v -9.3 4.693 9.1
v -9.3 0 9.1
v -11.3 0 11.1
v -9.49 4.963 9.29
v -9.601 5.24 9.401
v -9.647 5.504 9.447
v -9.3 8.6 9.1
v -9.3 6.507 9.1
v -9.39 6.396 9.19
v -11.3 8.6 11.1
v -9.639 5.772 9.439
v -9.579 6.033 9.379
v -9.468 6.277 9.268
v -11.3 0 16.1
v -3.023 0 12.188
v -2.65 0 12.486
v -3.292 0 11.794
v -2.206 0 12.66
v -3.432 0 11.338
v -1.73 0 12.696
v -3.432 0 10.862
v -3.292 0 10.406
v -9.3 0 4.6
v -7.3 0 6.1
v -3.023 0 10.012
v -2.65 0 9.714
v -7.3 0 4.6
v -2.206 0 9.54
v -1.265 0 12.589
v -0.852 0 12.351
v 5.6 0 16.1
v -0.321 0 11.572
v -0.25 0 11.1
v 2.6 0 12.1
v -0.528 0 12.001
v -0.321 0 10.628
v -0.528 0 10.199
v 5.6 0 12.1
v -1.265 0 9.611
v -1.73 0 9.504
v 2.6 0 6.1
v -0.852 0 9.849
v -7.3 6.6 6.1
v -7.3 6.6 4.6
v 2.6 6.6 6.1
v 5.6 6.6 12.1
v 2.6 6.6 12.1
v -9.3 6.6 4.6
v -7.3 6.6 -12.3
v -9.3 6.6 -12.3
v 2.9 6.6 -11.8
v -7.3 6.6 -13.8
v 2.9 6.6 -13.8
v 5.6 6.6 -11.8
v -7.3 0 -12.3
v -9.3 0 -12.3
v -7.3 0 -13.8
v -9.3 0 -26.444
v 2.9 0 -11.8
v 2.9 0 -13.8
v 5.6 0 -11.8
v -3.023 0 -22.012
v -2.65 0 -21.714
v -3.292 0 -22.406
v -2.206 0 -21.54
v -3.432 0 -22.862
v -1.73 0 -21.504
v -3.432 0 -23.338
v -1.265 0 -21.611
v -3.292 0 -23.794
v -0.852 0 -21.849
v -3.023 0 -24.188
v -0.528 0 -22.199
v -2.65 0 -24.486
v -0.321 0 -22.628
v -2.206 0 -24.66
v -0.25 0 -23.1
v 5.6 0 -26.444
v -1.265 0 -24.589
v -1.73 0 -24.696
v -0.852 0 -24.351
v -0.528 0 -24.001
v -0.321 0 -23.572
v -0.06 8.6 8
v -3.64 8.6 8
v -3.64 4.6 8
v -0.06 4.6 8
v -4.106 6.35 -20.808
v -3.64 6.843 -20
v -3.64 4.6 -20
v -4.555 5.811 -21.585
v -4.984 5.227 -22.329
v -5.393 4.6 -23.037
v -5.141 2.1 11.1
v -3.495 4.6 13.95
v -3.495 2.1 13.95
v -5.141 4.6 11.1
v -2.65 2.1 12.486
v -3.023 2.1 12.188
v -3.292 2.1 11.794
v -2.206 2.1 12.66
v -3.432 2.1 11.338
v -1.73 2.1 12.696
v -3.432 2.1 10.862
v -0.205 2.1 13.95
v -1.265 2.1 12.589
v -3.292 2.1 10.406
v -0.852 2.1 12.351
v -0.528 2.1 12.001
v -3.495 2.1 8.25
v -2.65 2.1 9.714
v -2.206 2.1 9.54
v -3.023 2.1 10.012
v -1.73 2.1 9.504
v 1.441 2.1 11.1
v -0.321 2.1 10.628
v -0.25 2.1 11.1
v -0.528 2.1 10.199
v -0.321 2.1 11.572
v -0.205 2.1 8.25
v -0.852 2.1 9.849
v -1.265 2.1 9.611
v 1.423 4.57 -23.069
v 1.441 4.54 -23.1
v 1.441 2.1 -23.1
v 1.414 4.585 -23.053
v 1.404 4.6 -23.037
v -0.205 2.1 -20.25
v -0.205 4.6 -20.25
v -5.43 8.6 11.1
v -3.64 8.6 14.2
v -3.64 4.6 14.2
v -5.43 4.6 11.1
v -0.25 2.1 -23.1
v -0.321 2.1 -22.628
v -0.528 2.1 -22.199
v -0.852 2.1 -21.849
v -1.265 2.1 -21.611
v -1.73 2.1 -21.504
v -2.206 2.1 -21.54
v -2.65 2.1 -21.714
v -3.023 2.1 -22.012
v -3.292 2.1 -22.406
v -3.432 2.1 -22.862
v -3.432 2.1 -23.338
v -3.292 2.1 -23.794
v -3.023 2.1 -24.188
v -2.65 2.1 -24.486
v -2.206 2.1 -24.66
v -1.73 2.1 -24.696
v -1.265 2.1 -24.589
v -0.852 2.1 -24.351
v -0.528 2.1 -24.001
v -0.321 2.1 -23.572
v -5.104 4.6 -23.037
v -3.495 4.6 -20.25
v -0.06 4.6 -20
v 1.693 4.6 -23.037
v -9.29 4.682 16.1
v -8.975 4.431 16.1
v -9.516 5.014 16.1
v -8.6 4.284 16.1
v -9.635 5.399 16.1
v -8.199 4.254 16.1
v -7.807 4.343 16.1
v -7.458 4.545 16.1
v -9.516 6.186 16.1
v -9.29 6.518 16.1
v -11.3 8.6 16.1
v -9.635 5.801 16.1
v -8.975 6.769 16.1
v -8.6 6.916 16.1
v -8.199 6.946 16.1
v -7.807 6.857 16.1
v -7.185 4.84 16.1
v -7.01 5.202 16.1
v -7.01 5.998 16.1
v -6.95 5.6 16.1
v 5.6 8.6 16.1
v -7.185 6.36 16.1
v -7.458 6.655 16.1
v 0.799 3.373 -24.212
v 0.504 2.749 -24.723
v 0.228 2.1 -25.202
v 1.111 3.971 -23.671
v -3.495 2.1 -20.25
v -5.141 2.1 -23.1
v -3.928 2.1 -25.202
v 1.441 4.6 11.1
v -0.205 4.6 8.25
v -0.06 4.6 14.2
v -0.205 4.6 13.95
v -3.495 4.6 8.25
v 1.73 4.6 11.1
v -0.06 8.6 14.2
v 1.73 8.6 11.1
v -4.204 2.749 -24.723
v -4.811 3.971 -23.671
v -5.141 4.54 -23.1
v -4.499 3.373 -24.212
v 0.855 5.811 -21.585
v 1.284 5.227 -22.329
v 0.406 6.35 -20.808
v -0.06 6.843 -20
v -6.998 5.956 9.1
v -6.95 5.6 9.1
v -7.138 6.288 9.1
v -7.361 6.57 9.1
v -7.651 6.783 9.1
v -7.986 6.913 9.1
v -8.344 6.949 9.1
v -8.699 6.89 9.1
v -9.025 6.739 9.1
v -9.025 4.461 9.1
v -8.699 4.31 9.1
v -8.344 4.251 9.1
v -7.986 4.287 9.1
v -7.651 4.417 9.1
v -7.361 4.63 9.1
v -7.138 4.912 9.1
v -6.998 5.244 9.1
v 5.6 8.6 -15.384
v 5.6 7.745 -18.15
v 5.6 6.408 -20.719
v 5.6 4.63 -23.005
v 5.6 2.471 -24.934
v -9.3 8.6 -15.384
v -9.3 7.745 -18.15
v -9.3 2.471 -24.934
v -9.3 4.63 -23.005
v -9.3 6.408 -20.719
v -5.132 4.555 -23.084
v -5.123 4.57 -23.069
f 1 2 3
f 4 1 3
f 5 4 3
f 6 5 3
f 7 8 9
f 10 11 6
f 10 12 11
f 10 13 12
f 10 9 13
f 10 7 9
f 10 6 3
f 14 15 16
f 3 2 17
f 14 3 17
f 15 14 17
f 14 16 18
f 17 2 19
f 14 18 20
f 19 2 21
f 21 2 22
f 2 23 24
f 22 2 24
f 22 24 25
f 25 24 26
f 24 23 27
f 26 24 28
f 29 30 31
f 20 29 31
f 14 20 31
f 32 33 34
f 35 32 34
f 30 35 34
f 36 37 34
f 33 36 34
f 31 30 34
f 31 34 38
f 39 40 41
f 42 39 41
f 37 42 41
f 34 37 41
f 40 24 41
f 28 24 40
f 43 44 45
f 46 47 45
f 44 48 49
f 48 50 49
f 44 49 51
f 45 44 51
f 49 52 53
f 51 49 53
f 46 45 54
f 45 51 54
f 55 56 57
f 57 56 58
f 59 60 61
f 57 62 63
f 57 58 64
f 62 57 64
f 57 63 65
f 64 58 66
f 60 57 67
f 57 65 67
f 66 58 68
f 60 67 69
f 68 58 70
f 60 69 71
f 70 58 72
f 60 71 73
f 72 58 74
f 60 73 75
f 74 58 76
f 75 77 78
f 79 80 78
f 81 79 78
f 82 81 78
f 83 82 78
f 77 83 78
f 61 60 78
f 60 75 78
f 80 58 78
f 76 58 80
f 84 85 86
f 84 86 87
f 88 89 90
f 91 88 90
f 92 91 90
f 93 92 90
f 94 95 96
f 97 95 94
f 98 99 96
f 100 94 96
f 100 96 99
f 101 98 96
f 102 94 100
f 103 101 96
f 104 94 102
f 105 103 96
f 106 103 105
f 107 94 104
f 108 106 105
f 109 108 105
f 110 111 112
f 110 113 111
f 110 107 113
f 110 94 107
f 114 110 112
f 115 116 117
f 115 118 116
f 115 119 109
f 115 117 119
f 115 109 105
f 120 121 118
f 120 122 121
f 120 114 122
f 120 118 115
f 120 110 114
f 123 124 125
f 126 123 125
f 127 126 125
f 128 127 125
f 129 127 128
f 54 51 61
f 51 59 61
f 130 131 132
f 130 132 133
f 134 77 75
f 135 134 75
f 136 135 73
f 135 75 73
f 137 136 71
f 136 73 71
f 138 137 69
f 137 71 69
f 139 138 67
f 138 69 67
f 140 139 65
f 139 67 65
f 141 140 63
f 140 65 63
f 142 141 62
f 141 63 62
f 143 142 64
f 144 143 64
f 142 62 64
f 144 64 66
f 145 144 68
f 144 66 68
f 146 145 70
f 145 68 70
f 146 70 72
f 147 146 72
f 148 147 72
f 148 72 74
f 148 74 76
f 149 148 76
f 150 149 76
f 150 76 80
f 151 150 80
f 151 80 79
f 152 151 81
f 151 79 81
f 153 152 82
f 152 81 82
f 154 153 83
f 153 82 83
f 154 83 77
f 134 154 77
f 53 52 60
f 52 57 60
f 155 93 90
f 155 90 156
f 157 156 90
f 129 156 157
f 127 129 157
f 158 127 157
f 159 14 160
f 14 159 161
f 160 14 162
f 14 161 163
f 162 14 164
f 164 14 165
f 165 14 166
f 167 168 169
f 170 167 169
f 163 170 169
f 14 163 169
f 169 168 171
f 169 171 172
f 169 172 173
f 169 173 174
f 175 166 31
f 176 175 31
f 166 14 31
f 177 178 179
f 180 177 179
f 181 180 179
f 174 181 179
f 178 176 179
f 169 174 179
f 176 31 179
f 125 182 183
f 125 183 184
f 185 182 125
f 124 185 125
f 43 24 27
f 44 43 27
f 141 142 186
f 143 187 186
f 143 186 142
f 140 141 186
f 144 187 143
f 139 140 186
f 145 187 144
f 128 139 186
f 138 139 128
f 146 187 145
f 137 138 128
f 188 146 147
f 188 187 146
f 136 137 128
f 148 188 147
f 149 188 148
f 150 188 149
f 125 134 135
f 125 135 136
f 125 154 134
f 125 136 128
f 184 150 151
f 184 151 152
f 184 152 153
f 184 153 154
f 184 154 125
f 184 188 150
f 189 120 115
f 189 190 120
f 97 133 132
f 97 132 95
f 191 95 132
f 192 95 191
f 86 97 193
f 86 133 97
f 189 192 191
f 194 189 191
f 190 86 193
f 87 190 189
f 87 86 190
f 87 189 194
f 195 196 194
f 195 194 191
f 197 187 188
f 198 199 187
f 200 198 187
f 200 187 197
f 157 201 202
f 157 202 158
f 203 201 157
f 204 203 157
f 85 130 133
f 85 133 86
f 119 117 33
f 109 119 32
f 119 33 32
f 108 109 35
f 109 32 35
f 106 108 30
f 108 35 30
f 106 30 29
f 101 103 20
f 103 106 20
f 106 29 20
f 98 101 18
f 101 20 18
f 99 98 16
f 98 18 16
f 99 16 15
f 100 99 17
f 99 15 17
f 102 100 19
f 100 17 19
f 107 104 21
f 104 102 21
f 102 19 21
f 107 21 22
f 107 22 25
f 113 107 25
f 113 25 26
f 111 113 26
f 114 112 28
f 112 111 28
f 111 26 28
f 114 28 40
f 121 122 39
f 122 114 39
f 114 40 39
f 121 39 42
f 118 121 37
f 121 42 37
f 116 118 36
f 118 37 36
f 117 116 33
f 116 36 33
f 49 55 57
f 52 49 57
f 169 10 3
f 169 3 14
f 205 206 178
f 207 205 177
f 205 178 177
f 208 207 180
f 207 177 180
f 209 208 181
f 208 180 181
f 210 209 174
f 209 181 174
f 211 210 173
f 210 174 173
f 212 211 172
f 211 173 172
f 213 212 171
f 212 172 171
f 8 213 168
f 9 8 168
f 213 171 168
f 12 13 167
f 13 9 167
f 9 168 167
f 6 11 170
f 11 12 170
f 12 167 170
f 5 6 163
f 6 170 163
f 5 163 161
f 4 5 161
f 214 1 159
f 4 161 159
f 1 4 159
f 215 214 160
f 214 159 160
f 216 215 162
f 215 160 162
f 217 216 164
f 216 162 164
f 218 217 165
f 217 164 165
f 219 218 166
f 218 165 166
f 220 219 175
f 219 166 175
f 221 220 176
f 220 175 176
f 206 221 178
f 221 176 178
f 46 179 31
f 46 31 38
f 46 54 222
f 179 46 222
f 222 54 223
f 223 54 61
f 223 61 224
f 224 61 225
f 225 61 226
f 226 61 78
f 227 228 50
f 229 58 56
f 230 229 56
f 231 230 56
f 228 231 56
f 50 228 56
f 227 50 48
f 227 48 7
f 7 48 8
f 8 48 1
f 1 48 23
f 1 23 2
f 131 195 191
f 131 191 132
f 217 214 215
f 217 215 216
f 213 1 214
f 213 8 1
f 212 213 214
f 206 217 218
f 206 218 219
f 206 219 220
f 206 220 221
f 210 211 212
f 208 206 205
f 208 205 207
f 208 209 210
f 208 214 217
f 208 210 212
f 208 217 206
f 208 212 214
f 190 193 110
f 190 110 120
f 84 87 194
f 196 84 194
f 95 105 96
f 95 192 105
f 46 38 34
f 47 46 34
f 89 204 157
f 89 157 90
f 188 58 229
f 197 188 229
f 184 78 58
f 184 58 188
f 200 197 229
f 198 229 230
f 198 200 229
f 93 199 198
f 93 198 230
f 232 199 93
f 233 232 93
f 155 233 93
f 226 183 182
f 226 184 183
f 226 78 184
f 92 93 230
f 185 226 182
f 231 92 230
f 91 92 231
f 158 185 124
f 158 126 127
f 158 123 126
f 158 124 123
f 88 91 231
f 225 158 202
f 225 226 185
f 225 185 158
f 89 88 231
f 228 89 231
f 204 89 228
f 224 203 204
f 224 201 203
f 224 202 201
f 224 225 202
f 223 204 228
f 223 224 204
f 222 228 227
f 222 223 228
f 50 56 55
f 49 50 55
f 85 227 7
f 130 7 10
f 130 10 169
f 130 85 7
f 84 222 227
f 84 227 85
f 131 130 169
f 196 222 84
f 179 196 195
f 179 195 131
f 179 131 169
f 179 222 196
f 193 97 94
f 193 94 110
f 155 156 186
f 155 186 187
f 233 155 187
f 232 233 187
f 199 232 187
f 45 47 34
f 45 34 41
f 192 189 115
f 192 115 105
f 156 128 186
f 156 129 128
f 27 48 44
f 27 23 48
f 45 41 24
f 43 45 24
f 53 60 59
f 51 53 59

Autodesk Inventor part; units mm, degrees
ref_plane "YZ Plane" through (0, 0, 0) normal (1, 0, 0) x (0, 1, 0)
ref_plane "XZ Plane" through (0, 0, 0) normal (0, 1, 0) x (-1, 0, 0)
sketch "スケッチ1" plane through (0, 0, 0) normal (0, 1, 0) x (-1, 0, 0)
  line L0 (4.5, 6) -> (-4.5, 6) construction
  line L1 (-4.5, 6) -> (-4.5, -18) construction
  line L2 (-4.5, -18) -> (4.5, -18) construction
  line L3 (4.5, -18) -> (4.5, 6) construction
  line L4 (4.5, -6) -> (-4.5, -6)
  line L5 (0, -25.74) -> (0, 13.74) projected
  line L6 (0.5, -18) -> (0.5, -6) construction
  line L7 (4.6, -18.1) -> (-4.6, -18.1)
  line L8 (-4.6, -18.1) -> (-4.6, 6.1)
  line L9 (-4.6, 6.1) -> (4.6, 6.1)
  line L10 (4.6, 6.1) -> (4.6, -18.1)
  line L11 (0.4, -18.1) -> (0.4, -6)
  line L12 (-4.5, -6) -> (-4.6, -6)
  line L13 (4.5, -6) -> (4.6, -6)
  line L14 (6.6, -20.1) -> (-6.6, -20.1)
  line L15 (-6.6, -20.1) -> (-6.6, 8.1)
  line L16 (-6.6, 8.1) -> (6.6, 8.1)
  line L17 (6.6, 8.1) -> (6.6, -20.1)
  line L18 (0.4, -18.1) -> (-14.8, -18.1)
  line L19 (-14.8, -18.1) -> (-14.8, -6)
  line L20 (-14.8, -6) -> (0.4, -6)
  line L21 (0.4, -6) -> (0.4, -18.1)
  line L22 (-6.6, -20.1) -> (-14.8, -20.1)
  line L23 (-14.8, -20.1) -> (-14.8, -18.1)
  point P0 (0, 0)
  point P1 (0, -6)
  point P2 (-6.6, -6)
  point P3 (0, -20.1)
  point P4 (-6.6, -6)
  dimension "d0" = 6
  dimension "d1" = 12
  dimension "d2" = 12
  dimension "d3" = 9
  dimension "d4" = 4
  dimension "d5" = 0.1
  dimension "d6" = 0.1
  dimension "d7" = 0.1
  dimension "d8" = 0.1
  dimension "d9" = 0.1
  dimension "d10" = 2
  dimension "d11" = 2
  dimension "d12" = 15.2
extrude "押し出し1" add sketch "スケッチ1" against normal blind 2
extrude "押し出し2" add sketch "スケッチ1" against normal blind 12.2 contours L13 L10 L7 L11 L4 | L11 L7 L5 L4 | L10 L9 L5 L16 L17 L14 L7 | L5 L7 L8 L12 L4 | L5 L14 L15 L18 L7 | L9 L8 L20 L15 L16 L5 | L8 L18 L15 L20 | L15 L18 L19 L20 | L22 L23 L18 L15
sketch "スケッチ2" plane through (14.8, 0, -6) normal (1, 0, 0) x (0, 0, -1)
  line L0 (0, 0) -> (0, -12.2) projected
  line L1 (0, -2) -> (14.1, -2)
  line L2 (14.1, 0) -> (14.1, -12.2) projected
  line L3 (0, 0) -> (14.1, 0) projected
  circle A0 centre (6.05, -7.1) radius 6.05
  line L4 (0, 0) -> (0, -12.2) projected
  line L5 (0, 0) -> (14.1, 0) projected
  line L6 (0, 0) -> (0, -12.2) projected
  line L7 (14.1, -12.2) -> (0, -12.2) projected
  line L8 (14.1, 0) -> (14.1, -12.2) projected
  line L9 (12.1, 0) -> (12.1, -12.2)
  point P0 (-6, 0)
  point P1 (14.1, -7.1)
  point P2 (9.3046, -2)
  point P3 (2.7954, -2)
  point P4 (0, -7.1)
  point P5 (2.7954, -12.2)
  point P6 (9.3046, -12.2)
  point P7 (0, -7.1)
  point P8 (12.1, -7.1)
  dimension "d17" = 2
  dimension "d18" = 5.1
  dimension "d21" = 2
extrude "押し出し3" cut sketch "スケッチ2" against normal blind 15.2 contours A0 L7 L0 | A0 L1 L7 | L9 L7 A0
sketch "スケッチ3" plane through (6.6, 0, 8.1) normal (1, 0, 0) x (0, 0, -1)
  circle A0 centre (8.1, -7.1) radius 3
  line L0 (14.1, -12.2) -> (0, -12.2) projected
  line L1 (5.1, -12.2) -> (11.1, -12.2)
  line L2 (11.1, -12.2) -> (11.1, -7.1)
  line L3 (11.1, -7.1) -> (5.1, -7.1)
  line L4 (5.1, -7.1) -> (5.1, -12.2)
  point P0 (8.1, 0)
  dimension "d22" = 6
  dimension "d23" = 7.1
extrude "押し出し4" cut sketch "スケッチ3" against normal up to surface (2 mm away)
fillet "フィレット1" radius 0.5 2 edges at (10.7, -7.1, -6) (2.1, -7.1, -6)
sketch "スケッチ4" plane through (-0.4, 0, -6) normal (1, 0, 0) x (0, 0, -1)
  line L0 (-14.1, -12.2) -> (14.1, -12.2) projected
  line L1 (0, -12.2) -> (12.1, -12.2)
  line L2 (12.1, -12.2) -> (12.1, -2)
  line L3 (12.1, -2) -> (0, -2)
  line L4 (0, -2) -> (0, -12.2)
  line L5 (12.1, -7.1) -> (12.1, -12.2) projected
  line L6 (2.7954, -2) -> (9.3046, -2) projected
  point P0 (-6, 0)
extrude "押し出し5" cut sketch "スケッチ4" against normal up to surface (4.2 mm away)
ref_plane "作業平面1" through (-3.6, -12.2, 6.1) normal (1, 0, 0) x (0, 0, -1)
sketch "スケッチ5" plane through (-3.6, -12.2, 6.1) normal (1, 0, 0) x (0, 0, -1)
  line L0 (0, 10.2) -> (7.1, 10.2)
  line L1 (7.1, 10.2) -> (7.1, 5.2)
  line L2 (7.1, 5.2) -> (0, 5.2)
  line L3 (0, 5.2) -> (0, 10.2)
  line L4 (9.1, 0) -> (9.1, 5.1) projected
  point P0 (6.1, 12.2)
  dimension "d30" = 5
  dimension "d34" = 2
extrude "押し出し6" add sketch "スケッチ5" along normal blind 1.5
fillet "フィレット2" radius 3 2 edges at (-2.85, -7, -1) (-2.85, -7, 6.1)
sketch "スケッチ6" plane through (0, 0, 0) normal (0, 1, 0) x (1, 0, 0)
  line L0 (-6.6, -8.1) -> (6.6, -8.1) projected
  line L1 (5.6, -8.1) -> (2.6, -8.1)
  line L2 (2.6, -8.1) -> (2.6, -0.1)
  line L3 (2.6, -0.1) -> (5.6, -0.1)
  line L4 (5.6, -0.1) -> (5.6, -8.1)
  line L5 (6.6, -8.1) -> (6.6, 6) projected
  line L6 (-9.3, -8.1) -> (-7.3, -8.1)
  line L7 (-7.3, -8.1) -> (-7.3, 13.8)
  line L8 (-7.3, 13.8) -> (-9.3, 13.8)
  line L9 (-9.3, 13.8) -> (-9.3, -8.1)
  line L10 (-4.6, -6.1) -> (4.6, -6.1) projected
  line L11 (-7.3, -8.1) -> (2.6, -8.1)
  line L12 (2.6, -8.1) -> (2.6, -6.1)
  line L13 (2.6, -6.1) -> (-7.3, -6.1)
  line L14 (-7.3, -6.1) -> (-7.3, -8.1)
  line L15 (-9.3, 13.8) -> (2.9, 13.8)
  line L16 (2.9, 13.8) -> (2.9, 15.8)
  line L17 (2.9, 15.8) -> (-9.3, 15.8)
  line L18 (-9.3, 15.8) -> (-9.3, 13.8)
  line L19 (-9.3, 12.3) -> (-7.3, 12.3)
  line L20 (-9.3, -4.6) -> (-7.3, -4.6)
  line L21 (-7.3, -1.4667) -> (-9.3, -1.4667)
  line L22 (-9.3, -1.4667) -> (-9.3, 1.5333)
  line L23 (-9.3, 1.5333) -> (-7.3, 1.5333)
  line L24 (-7.3, 1.5333) -> (-7.3, -1.4667)
  line L25 (-7.3, 6.1667) -> (-9.3, 6.1667)
  line L26 (-9.3, 6.1667) -> (-9.3, 9.1667)
  line L27 (-9.3, 9.1667) -> (-7.3, 9.1667)
  line L28 (-7.3, 9.1667) -> (-7.3, 6.1667)
  circle A0 centre (-4.5, 8.6) radius 1
  circle A1 centre (-4.5, -0.9) radius 1
  line L29 (-9.3, 3.85) -> (-0.8107, 3.85)
  line L30 (2.9, 15.8) -> (-9.3, 15.8)
  line L31 (-9.3, 15.8) -> (-9.3, 20.1)
  line L32 (-9.3, 20.1) -> (2.9, 20.1)
  line L33 (2.9, 20.1) -> (2.9, 15.8)
  line L34 (14.8, 20.1) -> (-6.6, 20.1) projected
  point P0 (0, 0)
  point P1 (-9.3, 6.1667)
  point P2 (-7.3, 3.85)
  point P3 (2.6, -8.1)
  point P4 (2.6, -8.1)
  dimension "d35" = 4
  dimension "d36" = 8
  dimension "d37" = 3
  dimension "d40" = 9.9
  dimension "d41" = 2
  dimension "d42" = 19.9
  dimension "d43" = 2
  dimension "d44" = 10.2
  dimension "d45" = 1.5
  dimension "d46" = 1.5
  dimension "d53" = 3
  dimension "d54" = 3
  dimension "d55" = 4.6333
  dimension "d56" = 4.6333
  dimension "d57" = 4.6333
  dimension "d60" = 2
  dimension "d61" = 2
  dimension "d62" = 7.1
  dimension "d63" = 9.5
extrude "押し出し7" add sketch "スケッチ6" along normal blind 6.6 contours L11 L7 L13 L10 L2 L0 | L2 L3 L4 L0 | L6 L9 L20 L7 | L9 L23 L7 L21 | L9 L27 L7 L25 | L9 L8 L7 L19 | L18 L17 L16 L15 L8 | L31 L32 L33 L17 | A0 | A1
chamfer "面取り1" distance 6 distance2 2 1 edges at (5.6, 3.3, 0.1) measured on face at (5.6, 2.2, 5.4333)
sketch "スケッチ7" plane through (-6.6, -12.2, -20.1) normal (-1, 0, 0) x (0, 0, 1)
  line L0 (0, 12.2) -> (0, 0) projected
  line L1 (28.2, 0) -> (0, 0) projected
  line L2 (28.2, 12.2) -> (28.2, 0) projected
  line L3 (26.2, 12.2) -> (28.2, 12.2) projected
  line L4 (6.3, 12.2) -> (26.2, 12.2) projected
  line L5 (0, 12.2) -> (6.3, 12.2) projected
  point P0 (20.1, 12.2)
extrude "押し出し8" add sketch "スケッチ7" along normal up to surface (2.7 mm away)
sketch "スケッチ8" plane through (0, 6.6, 0) normal (0, 1, 0) x (1, 0, 0)
  line L0 (14.8, 20.1) -> (-9.3, 20.1) projected
  line L1 (-9.3, -8.1) -> (5.6, -8.1)
  line L2 (5.6, -8.1) -> (5.6, 20.1)
  line L3 (5.6, 20.1) -> (-9.3, 20.1)
  line L4 (-9.3, 20.1) -> (-9.3, -8.1)
  line L5 (5.6, -8.1) -> (5.6, -6.1) projected
  circle A0 centre (-1.85, 23.1) radius 1.6
  circle A1 centre (-1.85, -11.1) radius 1.6
  line L6 (5.6, 6) -> (-9.3, 6)
  line L7 (-9.3, -8.1) -> (5.6, -8.1)
  line L8 (5.6, -8.1) -> (5.6, -16.1)
  line L9 (5.6, -16.1) -> (-9.3, -16.1)
  line L10 (-9.3, -16.1) -> (-9.3, -8.1)
  line L11 (-9.3, 20.1) -> (5.6, 20.1)
  line L12 (5.6, 20.1) -> (5.6, 28.1)
  line L13 (5.6, 28.1) -> (-9.3, 28.1)
  line L14 (-9.3, 28.1) -> (-9.3, 20.1)
  line L15 (-9.3, 20.1) -> (-9.3, -8.1) projected
  line L16 (-9.3, -8.1) -> (5.6, -8.1) projected
  point P0 (0, 0)
  point P1 (-1.85, 20.1)
  dimension "d64" = 3.2
  dimension "d65" = 3.2
  dimension "d66" = 3
  dimension "d67" = 8
extrude "押し出し9" add sketch "スケッチ8" along normal blind 2
extrude "押し出し10" add sketch "スケッチ8" against normal up to surface (18.8 mm away) contours L0 L14 L13 L12 | L1 L8 L9 L10
sketch "スケッチ9" plane through (0, 8.6, 0) normal (0, 1, 0) x (1, 0, 0)
  circle A0 centre (-1.85, -11.1) radius 1.6 projected
  circle A1 centre (-1.85, 23.1) radius 1.6 projected
  line L0 (1.4409, -11.1) -> (-0.2046, -13.95)
  line L1 (-0.2046, -13.95) -> (-3.4954, -13.95)
  line L2 (-3.4954, -13.95) -> (-5.1409, -11.1)
  line L3 (-5.1409, -11.1) -> (-3.4954, -8.25)
  line L4 (-3.4954, -8.25) -> (-0.2046, -8.25)
  line L5 (-0.2046, -8.25) -> (1.4409, -11.1)
  line L6 (-0.2046, 25.95) -> (1.4409, 23.1)
  line L7 (1.4409, 23.1) -> (-0.2046, 20.25)
  line L8 (-0.2046, 20.25) -> (-3.4954, 20.25)
  line L9 (-3.4954, 20.25) -> (-5.1409, 23.1)
  line L10 (-5.1409, 23.1) -> (-3.4954, 25.95)
  line L11 (-3.4954, 25.95) -> (-0.2046, 25.95)
  point P0 (0, 0)
  dimension "d72" = 5.7
extrude "押し出し11" cut sketch "スケッチ9" against normal blind 6.5 contours A0 | A1 | L0 L1 L2 L3 L4 L5 | L6 L7 L8 L9 L10 L11
sketch "スケッチ10" plane through (0, 8.6, 0) normal (0, 1, 0) x (1, 0, 0)
  circle A0 centre (-1.85, -11.1) radius 1.6 projected
  circle A1 centre (-1.85, 23.1) radius 1.6 projected
  line L0 (-3.6398, -8) -> (-0.0602, -8)
  line L1 (-0.0602, -8) -> (1.7296, -11.1)
  line L2 (1.7296, -11.1) -> (-0.0602, -14.2)
  line L3 (-0.0602, -14.2) -> (-3.6398, -14.2)
  line L4 (-3.6398, -14.2) -> (-5.4296, -11.1)
  line L5 (-5.4296, -11.1) -> (-3.6398, -8)
  line L6 (-3.6398, 26.2) -> (-0.0602, 26.2)
  line L7 (-0.0602, 26.2) -> (1.7296, 23.1)
  line L8 (1.7296, 23.1) -> (-0.0602, 20)
  line L9 (-0.0602, 20) -> (-3.6398, 20)
  line L10 (-3.6398, 20) -> (-5.4296, 23.1)
  line L11 (-5.4296, 23.1) -> (-3.6398, 26.2)
  line L12 (-0.2046, -13.95) -> (-3.4954, -13.95) projected
  line L13 (-0.2046, 20.25) -> (-3.4954, 20.25) projected
  point P0 (0, 0)
  dimension "d75" = 6.2
extrude "押し出し12" cut sketch "スケッチ10" against normal blind 4 contours A0 | A1 | L0 L1 L2 L3 L4 L5 | L6 L7 L8 L9 L10 L11
sketch "スケッチ11" plane through (14.8, 0, -6) normal (1, 0, 0) x (0, 0, -1)
  arc A0 (0, -3.6215) -> (0.9237, -3.887) centre (0.5, -3.6215) ccw projected
  arc A1 (2.7954, -2) -> (0.9237, -3.887) centre (6.05, -7.1) ccw projected
  line L0 (2.7954, -2) -> (9.3046, -2) projected
  arc A2 (12.1, -7.1) -> (9.3046, -2) centre (6.05, -7.1) ccw projected
  line L1 (12.1, -7.1) -> (12.1, -12.2) projected
  line L2 (14.1, -12.2) -> (12.1, -12.2) projected
  line L3 (14.1, 0) -> (14.1, -12.2) projected
  line L4 (0, 0) -> (14.1, 0) projected
  line L5 (0, 0) -> (0, -3.6215) projected
  line L6 (9.3046, -2) -> (14.1, -2)
  point P0 (-6, 0)
extrude "押し出し13" add sketch "スケッチ11" along normal blind 5 contours L5 L4 L3 L6 L0 A1 A0
sketch "スケッチ12" plane through (19.8, 0, -6) normal (1, 0, 0) x (0, 0, -1)
  line L0 (0, -7.1) -> (0, -12.2) projected
  line L1 (14.1, 0) -> (0, 0) projected
  line L2 (14.1, -2) -> (14.1, -12.2) projected
  line L3 (14.1, -12.2) -> (0, -12.2)
  line L4 (0, -12.2) -> (0, 0)
  line L5 (0, 0) -> (14.1, 0)
  line L6 (14.1, 0) -> (14.1, -12.2)
  point P0 (-6, 0)
extrude "押し出し14" add sketch "スケッチ12" along normal blind 2
sketch "スケッチ13" plane through (14.8, -12.2, -20.1) normal (0, 0, -1) x (-1, 0, 0)
  line L0 (8.2, 12.2) -> (-7, 12.2) projected
  line L1 (-7, 12.2) -> (-13, 12.2)
  line L2 (-13, 12.2) -> (-13, 0)
  line L3 (-13, 0) -> (-7, 0)
  line L4 (-7, 0) -> (-7, 12.2)
  circle A0 centre (-10, 3) radius 1.6
  line L5 (-5, 0) -> (-7, 0) projected
  point P0 (14.8, 12.2)
  dimension "d98" = 3.2
  dimension "d99" = 3
  dimension "d100" = 3
  dimension "d101" = 6
extrude "押し出し15" add sketch "スケッチ13" against normal up to surface (14.1 mm away)
sketch "スケッチ14" plane through (19.8, -12.2, -20.1) normal (0, -1, 0) x (1, 0, 0)
  line L0 (8, 0) -> (8, 14.1) projected
  line L1 (8, 4.55) -> (2, 4.55)
  line L2 (2, 4.55) -> (2, 9.55)
  line L3 (2, 9.55) -> (8, 9.55)
  line L4 (8, 9.55) -> (8, 4.55)
  line L5 (0, 14.1) -> (0, 0) projected
  point P0 (-19.8, 20.1)
  point P1 (2, 7.05)
  point P2 (0, 7.05)
  point P3 (8, 9.55)
  dimension "d104" = 2
  dimension "d105" = 5
extrude "押し出し16" cut sketch "スケッチ14" against normal through all
sketch "スケッチ15" plane through (14.8, -12.2, -20.1) normal (0, 0, -1) x (-1, 0, 0)
  circle A0 centre (-10, 3) radius 1.6 projected
  line L0 (-11.7321, 0) -> (-13.4641, 3)
  line L1 (-13.4641, 3) -> (-11.7321, 6)
  line L2 (-11.7321, 6) -> (-8.2679, 6)
  line L3 (-8.2679, 6) -> (-6.5359, 3)
  line L4 (-6.5359, 3) -> (-8.2679, 0)
  line L5 (-8.2679, 0) -> (-11.7321, 0)
  line L6 (-5, 0) -> (-13, 0) projected
  line L7 (-13, 12.2) -> (-13, 0) projected
  point P0 (14.8, 12.2)
  point P1 (-13, 3.8038)
  point P2 (-11.7321, 0)
extrude "押し出し17" cut sketch "スケッチ15" against normal blind 2 contours A0 | L6 L7 L0 | L0 L7 L1 L2 L3 L4 L5
sketch "スケッチ16" plane through (6.6, -3.6215, -6) normal (0, 0, 1) x (1, 0, 0)
  circle A0 centre (18.2, -5.5785) radius 1.6 projected
  circle A1 centre (18.2, -5.5785) radius 3
  circle A2 centre (18.2, -5.5785) radius 1.6 projected
  line L0 (13.2, 0) -> (0, 0) projected
  line L1 (13.2, 0) -> (13.2, -8.5785) projected
  line L2 (13.2, -8.5785) -> (21.2, -8.5785) projected
  line L3 (21.2, 3.6215) -> (21.2, -8.5785) projected
  line L4 (0, 3.6215) -> (21.2, 3.6215) projected
  line L5 (0, 3.6215) -> (0, 0) projected
  point P0 (-6.6, 3.6215)
  point P1 (21.2, -5.5785)
  point P2 (18.2, -8.5785)
extrude "押し出し18" cut sketch "スケッチ16" against normal blind 2.5 contours A1 | L3 L2 A1
fillet "フィレット3" radius 1 2 edges at (24.8, -12.2, -7.25) (27.8, -9.2, -7.25)
sketch "スケッチ17" plane through (0, 0, 0) normal (0, 1, 0) x (1, 0, 0)
  circle A0 centre (-4.5, 8.6) radius 1 projected
  circle A1 centre (-4.5, -0.9) radius 1 projected
  line L0 (27.8, 10.55) -> (21.8, 10.55) projected
  line L1 (21.8, 10.55) -> (21.8, 15.55) projected
  line L2 (21.8, 15.55) -> (27.8, 15.55) projected
  line L3 (27.8, 20.1) -> (27.8, 15.55) projected
  line L4 (27.8, 20.1) -> (5.6, 20.1) projected
  line L5 (5.6, 20.1) -> (2.9, 20.1) projected
  line L6 (-7.3, 13.8) -> (2.9, 13.8) projected
  line L7 (-7.3, 12.3) -> (-7.3, 13.8) projected
  line L8 (-7.3, -6.1) -> (2.6, -6.1) projected
  line L9 (2.6, -6.1) -> (2.6, -0.1) projected
  line L10 (2.6, -0.1) -> (3.6, -0.1) projected
  line L11 (5.6, -6.1) -> (3.6, -0.1) projected
  line L12 (5.6, -6.1) -> (5.6, -8.1) projected
  line L13 (5.6, -8.1) -> (6.6, -8.1) projected
  line L14 (6.6, -8.1) -> (6.6, 6) projected
  line L15 (6.6, 6) -> (27.8, 6) projected
  line L16 (27.8, 10.55) -> (27.8, 6) projected
  line L17 (2.6, -6.1) -> (2.6, -0.1) projected
  line L18 (2.6, -0.1) -> (6.6, -0.1)
  line L19 (6.6, -0.1) -> (6.6, -12.1)
  line L20 (6.6, -12.1) -> (2.6, -12.1)
  line L21 (2.6, -12.1) -> (2.6, -0.1)
  line L22 (6.6, -8.1) -> (6.6, 6) projected
  line L23 (2.9, 20.1) -> (2.9, 13.8) projected
  line L24 (-9.3, 12.3) -> (-7.3, 12.3) projected
  line L25 (-9.3, 12.3) -> (-9.3, 9.1667) projected
  line L26 (-7.3, 9.1667) -> (-9.3, 9.1667) projected
  line L27 (-7.3, 6.1667) -> (-7.3, 9.1667) projected
  line L28 (-9.3, 6.1667) -> (-7.3, 6.1667) projected
  line L29 (-9.3, 6.1667) -> (-9.3, 1.5333) projected
  line L30 (-7.3, 1.5333) -> (-9.3, 1.5333) projected
  line L31 (-7.3, -1.4667) -> (-7.3, 1.5333) projected
  line L32 (-9.3, -1.4667) -> (-7.3, -1.4667) projected
  line L33 (-9.3, -1.4667) -> (-9.3, -4.6) projected
  line L34 (-7.3, -4.6) -> (-9.3, -4.6) projected
  line L35 (-7.3, -6.1) -> (-7.3, -4.6) projected
  point P0 (0, 0)
  dimension "d116" = 12
extrude "押し出し19" cut sketch "スケッチ17" along normal up to surface (6.6 mm away) contours L14 L13 L12 L11 L18 | L19 L20 L21 L9 L10 L11 L12 L13
sketch "スケッチ18" plane through (0, 0, 0) normal (0, 1, 0) x (1, 0, 0)
  line L0 (2.9, 11.8) -> (5.6, 11.8)
  line L1 (5.6, 11.8) -> (5.6, 20.1)
  line L2 (5.6, 20.1) -> (2.9, 20.1)
  line L3 (2.9, 20.1) -> (2.9, 11.8)
  line L4 (5.6, 20.1) -> (2.9, 20.1) projected
  line L5 (5.6, -12.1) -> (5.6, 20.1) projected
  line L6 (2.9, 20.1) -> (2.9, 13.8) projected
  line L7 (-7.3, 13.8) -> (2.9, 13.8) projected
  point P0 (0, 0)
  dimension "d122" = 2
extrude "押し出し20" add sketch "スケッチ18" along normal up to surface (6.6 mm away)
sketch "スケッチ23" plane through (6.6, 0, 8.1) normal (1, 0, 0) x (0, 0, -1)
  line L0 (11.1, -7.1) -> (11.1, -12.2) projected
  line L1 (14.1, -12.2) -> (11.1, -12.2) projected
  line L2 (14.1, -7.1) -> (14.1, -12.2) projected
  arc A0 (15.0237, -3.887) -> (14.1, -7.1) centre (20.15, -7.1) ccw projected
  arc A1 (14.1, -3.6215) -> (15.0237, -3.887) centre (14.6, -3.6215) ccw projected
  line L3 (14.1, 0) -> (14.1, -3.6215) projected
  line L4 (0, 0) -> (14.1, 0) projected
  line L5 (0, 0) -> (0, -12.2) projected
  line L6 (5.1, -12.2) -> (0, -12.2) projected
  line L7 (5.1, -12.2) -> (5.1, -7.1) projected
  arc A2 (11.1, -7.1) -> (5.1, -7.1) centre (8.1, -7.1) ccw projected
  arc A3 (11.1, -7.1) -> (5.1, -7.1) centre (8.1, -7.1) ccw projected
  circle A4 centre (8.1, -7.1) radius 5.5
  line L8 (8.1, -1.6) -> (-21.9, -1.6)
  line L9 (-21.9, -1.6) -> (-21.9, -12.6)
  line L10 (-21.9, -12.6) -> (8.1, -12.6)
  line L11 (8.1, -12.6) -> (8.1, -1.6)
  line L12 (-8, 8.6) -> (-8, -12.2) projected
  line L13 (-8, -12.2) -> (-8, -12.6)
  line L14 (11.1, -12.2) -> (11.1, -7.1) projected
  arc A5 (11.1, -7.1) -> (5.1, -7.1) centre (8.1, -7.1) ccw projected
  line L15 (5.1, -7.1) -> (5.1, -12.2) projected
  line L16 (2, -12.2) -> (5.1, -12.2) projected
  line L17 (2, -2) -> (2, -12.2) projected
  line L18 (14.1, -2) -> (2, -2) projected
  line L19 (14.1, -2) -> (14.1, -3.6215) projected
  arc A6 (14.1, -3.6215) -> (15.0237, -3.887) centre (14.6, -3.6215) ccw projected
  arc A7 (15.0237, -3.887) -> (14.1, -7.1) centre (20.15, -7.1) ccw projected
  line L20 (14.1, -7.1) -> (14.1, -12.2) projected
  line L21 (11.1, -12.2) -> (14.1, -12.2) projected
  line L22 (2, -2) -> (2, -12.2) projected
  line L23 (2, -12.2) -> (2, -12.6)
  line L24 (2, -2) -> (2, -1.6)
  line L25 (-8, -12.2) -> (0, -12.2) projected
  point P0 (8.1, 0)
  dimension "d138" = 11
  dimension "d139" = 30
extrude "押し出し24" add sketch "スケッチ23" against normal blind 10 contours L10 L9 L8 L12 L13 | L6 L5 L8 L24 L17 | L12 L8 L5 L25
sketch "スケッチ24" plane through (0, -2, 0) normal (0, -1, 0) x (1, 0, 0)
  line L0 (2.9, 5.1) -> (-0.1, 5.1)
  line L1 (-0.1, 5.1) -> (-0.1, -5)
  line L2 (-0.1, -5) -> (2.9, -5)
  line L3 (4.6, -3) -> (4.6, 3) projected
  line L4 (-4.6, 6.1) -> (4.6, 6.1) projected
  line L5 (4.6, -6) -> (-0.4, -6) projected
  line L6 (-2.1, 2) -> (-2.1, -1) projected
  line L7 (-2.1, 6.1) -> (-2.1, -1) projected
  line L8 (-2.1, -1) -> (-3.6, -1) projected
  line L9 (-3.6, -1) -> (-3.6, 6.1) projected
  line L10 (-3.6, 6.1) -> (-4.6, 6.1) projected
  line L11 (-4.6, 6.1) -> (-4.6, -18.1) projected
  line L12 (-0.4, -18.1) -> (-4.6, -18.1) projected
  line L13 (-0.4, -18.1) -> (-0.4, -15.3046) projected
  line L14 (14.8, -15.3046) -> (-0.4, -15.3046) projected
  line L15 (14.8, -20.1) -> (14.8, -15.3046) projected
  line L16 (14.8, -20.1) -> (19.8, -20.1) projected
  line L17 (19.8, -8.7954) -> (19.8, -20.1) projected
  line L18 (19.8, -8.7954) -> (-0.4, -8.7954) projected
  line L19 (-0.4, -8.7954) -> (-0.4, -6) projected
  line L20 (-0.4, -6) -> (4.6, -6) projected
  line L21 (4.6, -6) -> (4.6, 6.1) projected
  line L22 (4.6, 6.1) -> (-2.1, 6.1) projected
  line L23 (14.8, -15.3046) -> (4.6, -15.3046)
  line L24 (4.6, -15.3046) -> (4.6, -8.7954)
  line L25 (4.6, -8.7954) -> (14.8, -8.7954)
  line L26 (14.8, -8.7954) -> (14.8, -15.3046)
  line L27 (4.6, -3) -> (4.6, -6) projected
  line L28 (2.9, 5.1) -> (2.9, -5)
  point P0 (0, 0)
  dimension "d143" = 1
  dimension "d144" = 1
  dimension "d145" = 2
  dimension "d146" = 3
extrude "押し出し25" cut sketch "スケッチ24" against normal up to surface (2 mm away) contours L28 L2 L1 L0 | L18 L26 L14 L24
sketch "スケッチ26" plane through (0, -12.2, 0) normal (0, -1, 0) x (1, 0, 0)
  arc A0 (-3.4, 10.7031) -> (-3.4, 11.4969) centre (-1.85, 11.1) ccw projected
  circle A1 centre (-1.85, 11.1) radius 1.6
  point P0 (0, 0)
extrude "押し出し27" cut sketch "スケッチ26" against normal through all
sketch "スケッチ27" plane through (6.6, -1.6, 30) normal (0, 1, 0) x (1, 0, 0)
  circle A0 centre (-2.5, 3) radius 1.6
  circle A1 centre (-7.5, 3) radius 1.6
  line L0 (-10, 0) -> (-10, 13.9) projected
  line L1 (0, 21.9) -> (0, 0) projected
  line L2 (0, 0) -> (-10, 0) projected
  point P0 (-6.6, 30)
  dimension "d155" = 3.2
  dimension "d156" = 3.2
  dimension "d157" = 2.5
  dimension "d158" = 2.5
  dimension "d159" = 3
extrude "押し出し28" cut sketch "スケッチ27" against normal through all
sketch "スケッチ29" plane through (-9.3, -12.2, 16.1) normal (-1, 0, 0) x (0, 0, 1)
  arc A0 (-31.4046, 10.2) -> (-34.2, 5.1) centre (-28.15, 5.1) ccw projected
  circle A1 centre (-28.15, 5.1) radius 5
  point P0 (-16.1, 12.2)
  dimension "d163" = 10
extrude "押し出し29" cut sketch "スケッチ29" against normal up to surface (4.7 mm away)
sketch "スケッチ30" plane through (5.6, -12.2, -20.1) normal (1, 0, 0) x (0, 0, -1)
  arc A0 (-2, 5.1) -> (-4.7954, 10.2) centre (-8.05, 5.1) ccw projected
  circle A1 centre (-8.05, 5.1) radius 5 projected
  circle A2 centre (-8.05, 5.1) radius 16.05
  line L0 (8, 0) -> (8, 20.8) projected
  line L1 (8, 0) -> (8, 20.8) projected
  line L2 (-0.1, 20.8) -> (3, 20.8) projected
  line L3 (3, 20.8) -> (6.1, 20.8) projected
  line L4 (6.1, 20.8) -> (3, 20.8) projected
  line L5 (3, 20.8) -> (-0.1, 20.8) projected
  line L6 (-34.3, 20.8) -> (-31.2, 20.8) projected
  line L7 (-31.2, 20.8) -> (-28.1, 20.8) projected
  line L8 (-28.1, 20.8) -> (-31.2, 20.8) projected
  line L9 (-31.2, 20.8) -> (-34.3, 20.8) projected
  line L10 (-36.2, 20.8) -> (8, 20.8) projected
  line L11 (8, 20.8) -> (-36.2, 20.8) projected
  line L12 (-32.8, 0) -> (-29.6, 0) projected
  line L13 (1.4, 0) -> (4.6, 0) projected
  line L14 (-26.2, 0) -> (-23.1, 0) projected
  line L15 (-23.1, 0) -> (-36.2, 0) projected
  line L16 (8, 0) -> (-36.2, 0) projected
  line L17 (0, 0) -> (8, 0) projected
  line L18 (0, 0) -> (-2, 0) projected
  line L19 (-2, 0) -> (-26.2, 0) projected
  point P0 (-20.1, 12.2)
  point P1 (7.1682, 0)
  point P2 (8, 5.1)
  point P3 (-4.7165, 20.8)
extrude "押し出し30" cut sketch "スケッチ30" against normal through all contours L0 L16 A2 | A2 L10 L2 L3 L0
sketch "スケッチ32" plane through (-9.3, -12.2, 16.1) normal (-1, 0, 0) x (0, 0, 1)
  arc A0 (-31.4835, 20.8) -> (-43.3682, 0) centre (-28.15, 5.1) ccw projected
  line L0 (-43.3682, 0) -> (0, 0) projected
  line L1 (0, 0) -> (0, 20.8) projected
  line L2 (-31.4835, 20.8) -> (0, 20.8) projected
  circle A1 centre (-28.15, 5.1) radius 5 projected
  line L3 (-17.6333, 12.2) -> (-17.6333, 18.8) projected
  line L4 (-22.2667, 12.2) -> (-17.6333, 12.2) projected
  line L5 (-22.2667, 12.2) -> (-22.2667, 18.8) projected
  line L6 (-22.2667, 18.8) -> (-17.6333, 18.8) projected
  line L7 (-25.2667, 12.2) -> (-25.2667, 18.8) projected
  line L8 (-28.4, 12.2) -> (-25.2667, 12.2) projected
  line L9 (-28.4, 12.2) -> (-28.4, 18.8) projected
  line L10 (-28.4, 18.8) -> (-25.2667, 18.8) projected
  line L11 (-14.6333, 18.8) -> (-11.5, 18.8) projected
  line L12 (-11.5, 12.2) -> (-11.5, 18.8) projected
  line L13 (-14.6333, 12.2) -> (-11.5, 12.2) projected
  line L14 (-14.6333, 12.2) -> (-14.6333, 18.8) projected
  line L15 (0, 20.8) -> (-7, 20.8)
  line L16 (-7, 20.8) -> (-7, 0)
  line L17 (-7, 0) -> (0, 0)
  line L18 (0, 0) -> (0, 20.8)
  point P0 (-16.1, 12.2)
  point P1 (-7, 20.8)
  dimension "d172" = 7
extrude "押し出し32" add sketch "スケッチ32" along normal blind 2 contours L2 L1 L0 L16
sketch "スケッチ33" plane through (-3.4, -1.6, 16.1) normal (0, 0, 1) x (1, 0, 0)
  circle A0 centre (-4.9, 7.2) radius 3
  circle A1 centre (-4.9, 7.2) radius 1.35
  line L0 (9, 10.2) -> (-7.9, 10.2) projected
  line L1 (-7.9, -10.6) -> (-7.9, 10.2) projected
  point P0 (3.4, 1.6)
  dimension "d175" = 2.7
  dimension "d176" = 6
extrude "押し出し33" cut sketch "スケッチ33" against normal up to surface (7 mm away) contours A1
chamfer "面取り2" distance 2 angle 45 1 edges at (-11.3, -1.8, 9.1)
sketch "スケッチ35" plane through (0, 0, 0) normal (0, 1, 0) x (1, 0, 0)
  line L0 (-26.8329, -47.9968) -> (35.8086, -47.9968)
  line L1 (35.8086, -47.9968) -> (35.8086, 46.6741)
  line L2 (35.8086, 46.6741) -> (-26.8329, 46.6741)
  line L3 (-26.8329, 46.6741) -> (-26.8329, -47.9968)
  point P0 (0, 0)
extrude "押し出し34" cut sketch "スケッチ35" against normal through all
sketch "スケッチ36" plane through (0, 6.6, 0) normal (0, -1, 0) x (1, 0, 0)
  circle A0 centre (-4.5, 0.9) radius 1 projected
  line L0 (-9.3, -1.5333) -> (-9.3, 1.4667) projected
  line L1 (-7.3, -1.5333) -> (-9.3, -1.5333) projected
  line L2 (-7.3, 1.4667) -> (-7.3, -1.5333) projected
  line L3 (-9.3, 1.4667) -> (-7.3, 1.4667) projected
  circle A1 centre (-4.5, -8.6) radius 1 projected
  line L4 (-7.3, -9.1667) -> (-9.3, -9.1667) projected
  line L5 (-7.3, -6.1667) -> (-7.3, -9.1667) projected
  line L6 (-9.3, -6.1667) -> (-7.3, -6.1667) projected
  line L7 (-9.3, -9.1667) -> (-9.3, -6.1667) projected
  point P0 (0, 0)
extrude "押し出し35" cut sketch "スケッチ36" along normal through all
equation "\"d21\" = d17"
equation "\"d54\" = d53"
equation "\"d55\" = d57"
equation "\"d56\" = d57"
equation "\"d158\" = d157"
properties part number "hand_motor_setter_base_upper"
